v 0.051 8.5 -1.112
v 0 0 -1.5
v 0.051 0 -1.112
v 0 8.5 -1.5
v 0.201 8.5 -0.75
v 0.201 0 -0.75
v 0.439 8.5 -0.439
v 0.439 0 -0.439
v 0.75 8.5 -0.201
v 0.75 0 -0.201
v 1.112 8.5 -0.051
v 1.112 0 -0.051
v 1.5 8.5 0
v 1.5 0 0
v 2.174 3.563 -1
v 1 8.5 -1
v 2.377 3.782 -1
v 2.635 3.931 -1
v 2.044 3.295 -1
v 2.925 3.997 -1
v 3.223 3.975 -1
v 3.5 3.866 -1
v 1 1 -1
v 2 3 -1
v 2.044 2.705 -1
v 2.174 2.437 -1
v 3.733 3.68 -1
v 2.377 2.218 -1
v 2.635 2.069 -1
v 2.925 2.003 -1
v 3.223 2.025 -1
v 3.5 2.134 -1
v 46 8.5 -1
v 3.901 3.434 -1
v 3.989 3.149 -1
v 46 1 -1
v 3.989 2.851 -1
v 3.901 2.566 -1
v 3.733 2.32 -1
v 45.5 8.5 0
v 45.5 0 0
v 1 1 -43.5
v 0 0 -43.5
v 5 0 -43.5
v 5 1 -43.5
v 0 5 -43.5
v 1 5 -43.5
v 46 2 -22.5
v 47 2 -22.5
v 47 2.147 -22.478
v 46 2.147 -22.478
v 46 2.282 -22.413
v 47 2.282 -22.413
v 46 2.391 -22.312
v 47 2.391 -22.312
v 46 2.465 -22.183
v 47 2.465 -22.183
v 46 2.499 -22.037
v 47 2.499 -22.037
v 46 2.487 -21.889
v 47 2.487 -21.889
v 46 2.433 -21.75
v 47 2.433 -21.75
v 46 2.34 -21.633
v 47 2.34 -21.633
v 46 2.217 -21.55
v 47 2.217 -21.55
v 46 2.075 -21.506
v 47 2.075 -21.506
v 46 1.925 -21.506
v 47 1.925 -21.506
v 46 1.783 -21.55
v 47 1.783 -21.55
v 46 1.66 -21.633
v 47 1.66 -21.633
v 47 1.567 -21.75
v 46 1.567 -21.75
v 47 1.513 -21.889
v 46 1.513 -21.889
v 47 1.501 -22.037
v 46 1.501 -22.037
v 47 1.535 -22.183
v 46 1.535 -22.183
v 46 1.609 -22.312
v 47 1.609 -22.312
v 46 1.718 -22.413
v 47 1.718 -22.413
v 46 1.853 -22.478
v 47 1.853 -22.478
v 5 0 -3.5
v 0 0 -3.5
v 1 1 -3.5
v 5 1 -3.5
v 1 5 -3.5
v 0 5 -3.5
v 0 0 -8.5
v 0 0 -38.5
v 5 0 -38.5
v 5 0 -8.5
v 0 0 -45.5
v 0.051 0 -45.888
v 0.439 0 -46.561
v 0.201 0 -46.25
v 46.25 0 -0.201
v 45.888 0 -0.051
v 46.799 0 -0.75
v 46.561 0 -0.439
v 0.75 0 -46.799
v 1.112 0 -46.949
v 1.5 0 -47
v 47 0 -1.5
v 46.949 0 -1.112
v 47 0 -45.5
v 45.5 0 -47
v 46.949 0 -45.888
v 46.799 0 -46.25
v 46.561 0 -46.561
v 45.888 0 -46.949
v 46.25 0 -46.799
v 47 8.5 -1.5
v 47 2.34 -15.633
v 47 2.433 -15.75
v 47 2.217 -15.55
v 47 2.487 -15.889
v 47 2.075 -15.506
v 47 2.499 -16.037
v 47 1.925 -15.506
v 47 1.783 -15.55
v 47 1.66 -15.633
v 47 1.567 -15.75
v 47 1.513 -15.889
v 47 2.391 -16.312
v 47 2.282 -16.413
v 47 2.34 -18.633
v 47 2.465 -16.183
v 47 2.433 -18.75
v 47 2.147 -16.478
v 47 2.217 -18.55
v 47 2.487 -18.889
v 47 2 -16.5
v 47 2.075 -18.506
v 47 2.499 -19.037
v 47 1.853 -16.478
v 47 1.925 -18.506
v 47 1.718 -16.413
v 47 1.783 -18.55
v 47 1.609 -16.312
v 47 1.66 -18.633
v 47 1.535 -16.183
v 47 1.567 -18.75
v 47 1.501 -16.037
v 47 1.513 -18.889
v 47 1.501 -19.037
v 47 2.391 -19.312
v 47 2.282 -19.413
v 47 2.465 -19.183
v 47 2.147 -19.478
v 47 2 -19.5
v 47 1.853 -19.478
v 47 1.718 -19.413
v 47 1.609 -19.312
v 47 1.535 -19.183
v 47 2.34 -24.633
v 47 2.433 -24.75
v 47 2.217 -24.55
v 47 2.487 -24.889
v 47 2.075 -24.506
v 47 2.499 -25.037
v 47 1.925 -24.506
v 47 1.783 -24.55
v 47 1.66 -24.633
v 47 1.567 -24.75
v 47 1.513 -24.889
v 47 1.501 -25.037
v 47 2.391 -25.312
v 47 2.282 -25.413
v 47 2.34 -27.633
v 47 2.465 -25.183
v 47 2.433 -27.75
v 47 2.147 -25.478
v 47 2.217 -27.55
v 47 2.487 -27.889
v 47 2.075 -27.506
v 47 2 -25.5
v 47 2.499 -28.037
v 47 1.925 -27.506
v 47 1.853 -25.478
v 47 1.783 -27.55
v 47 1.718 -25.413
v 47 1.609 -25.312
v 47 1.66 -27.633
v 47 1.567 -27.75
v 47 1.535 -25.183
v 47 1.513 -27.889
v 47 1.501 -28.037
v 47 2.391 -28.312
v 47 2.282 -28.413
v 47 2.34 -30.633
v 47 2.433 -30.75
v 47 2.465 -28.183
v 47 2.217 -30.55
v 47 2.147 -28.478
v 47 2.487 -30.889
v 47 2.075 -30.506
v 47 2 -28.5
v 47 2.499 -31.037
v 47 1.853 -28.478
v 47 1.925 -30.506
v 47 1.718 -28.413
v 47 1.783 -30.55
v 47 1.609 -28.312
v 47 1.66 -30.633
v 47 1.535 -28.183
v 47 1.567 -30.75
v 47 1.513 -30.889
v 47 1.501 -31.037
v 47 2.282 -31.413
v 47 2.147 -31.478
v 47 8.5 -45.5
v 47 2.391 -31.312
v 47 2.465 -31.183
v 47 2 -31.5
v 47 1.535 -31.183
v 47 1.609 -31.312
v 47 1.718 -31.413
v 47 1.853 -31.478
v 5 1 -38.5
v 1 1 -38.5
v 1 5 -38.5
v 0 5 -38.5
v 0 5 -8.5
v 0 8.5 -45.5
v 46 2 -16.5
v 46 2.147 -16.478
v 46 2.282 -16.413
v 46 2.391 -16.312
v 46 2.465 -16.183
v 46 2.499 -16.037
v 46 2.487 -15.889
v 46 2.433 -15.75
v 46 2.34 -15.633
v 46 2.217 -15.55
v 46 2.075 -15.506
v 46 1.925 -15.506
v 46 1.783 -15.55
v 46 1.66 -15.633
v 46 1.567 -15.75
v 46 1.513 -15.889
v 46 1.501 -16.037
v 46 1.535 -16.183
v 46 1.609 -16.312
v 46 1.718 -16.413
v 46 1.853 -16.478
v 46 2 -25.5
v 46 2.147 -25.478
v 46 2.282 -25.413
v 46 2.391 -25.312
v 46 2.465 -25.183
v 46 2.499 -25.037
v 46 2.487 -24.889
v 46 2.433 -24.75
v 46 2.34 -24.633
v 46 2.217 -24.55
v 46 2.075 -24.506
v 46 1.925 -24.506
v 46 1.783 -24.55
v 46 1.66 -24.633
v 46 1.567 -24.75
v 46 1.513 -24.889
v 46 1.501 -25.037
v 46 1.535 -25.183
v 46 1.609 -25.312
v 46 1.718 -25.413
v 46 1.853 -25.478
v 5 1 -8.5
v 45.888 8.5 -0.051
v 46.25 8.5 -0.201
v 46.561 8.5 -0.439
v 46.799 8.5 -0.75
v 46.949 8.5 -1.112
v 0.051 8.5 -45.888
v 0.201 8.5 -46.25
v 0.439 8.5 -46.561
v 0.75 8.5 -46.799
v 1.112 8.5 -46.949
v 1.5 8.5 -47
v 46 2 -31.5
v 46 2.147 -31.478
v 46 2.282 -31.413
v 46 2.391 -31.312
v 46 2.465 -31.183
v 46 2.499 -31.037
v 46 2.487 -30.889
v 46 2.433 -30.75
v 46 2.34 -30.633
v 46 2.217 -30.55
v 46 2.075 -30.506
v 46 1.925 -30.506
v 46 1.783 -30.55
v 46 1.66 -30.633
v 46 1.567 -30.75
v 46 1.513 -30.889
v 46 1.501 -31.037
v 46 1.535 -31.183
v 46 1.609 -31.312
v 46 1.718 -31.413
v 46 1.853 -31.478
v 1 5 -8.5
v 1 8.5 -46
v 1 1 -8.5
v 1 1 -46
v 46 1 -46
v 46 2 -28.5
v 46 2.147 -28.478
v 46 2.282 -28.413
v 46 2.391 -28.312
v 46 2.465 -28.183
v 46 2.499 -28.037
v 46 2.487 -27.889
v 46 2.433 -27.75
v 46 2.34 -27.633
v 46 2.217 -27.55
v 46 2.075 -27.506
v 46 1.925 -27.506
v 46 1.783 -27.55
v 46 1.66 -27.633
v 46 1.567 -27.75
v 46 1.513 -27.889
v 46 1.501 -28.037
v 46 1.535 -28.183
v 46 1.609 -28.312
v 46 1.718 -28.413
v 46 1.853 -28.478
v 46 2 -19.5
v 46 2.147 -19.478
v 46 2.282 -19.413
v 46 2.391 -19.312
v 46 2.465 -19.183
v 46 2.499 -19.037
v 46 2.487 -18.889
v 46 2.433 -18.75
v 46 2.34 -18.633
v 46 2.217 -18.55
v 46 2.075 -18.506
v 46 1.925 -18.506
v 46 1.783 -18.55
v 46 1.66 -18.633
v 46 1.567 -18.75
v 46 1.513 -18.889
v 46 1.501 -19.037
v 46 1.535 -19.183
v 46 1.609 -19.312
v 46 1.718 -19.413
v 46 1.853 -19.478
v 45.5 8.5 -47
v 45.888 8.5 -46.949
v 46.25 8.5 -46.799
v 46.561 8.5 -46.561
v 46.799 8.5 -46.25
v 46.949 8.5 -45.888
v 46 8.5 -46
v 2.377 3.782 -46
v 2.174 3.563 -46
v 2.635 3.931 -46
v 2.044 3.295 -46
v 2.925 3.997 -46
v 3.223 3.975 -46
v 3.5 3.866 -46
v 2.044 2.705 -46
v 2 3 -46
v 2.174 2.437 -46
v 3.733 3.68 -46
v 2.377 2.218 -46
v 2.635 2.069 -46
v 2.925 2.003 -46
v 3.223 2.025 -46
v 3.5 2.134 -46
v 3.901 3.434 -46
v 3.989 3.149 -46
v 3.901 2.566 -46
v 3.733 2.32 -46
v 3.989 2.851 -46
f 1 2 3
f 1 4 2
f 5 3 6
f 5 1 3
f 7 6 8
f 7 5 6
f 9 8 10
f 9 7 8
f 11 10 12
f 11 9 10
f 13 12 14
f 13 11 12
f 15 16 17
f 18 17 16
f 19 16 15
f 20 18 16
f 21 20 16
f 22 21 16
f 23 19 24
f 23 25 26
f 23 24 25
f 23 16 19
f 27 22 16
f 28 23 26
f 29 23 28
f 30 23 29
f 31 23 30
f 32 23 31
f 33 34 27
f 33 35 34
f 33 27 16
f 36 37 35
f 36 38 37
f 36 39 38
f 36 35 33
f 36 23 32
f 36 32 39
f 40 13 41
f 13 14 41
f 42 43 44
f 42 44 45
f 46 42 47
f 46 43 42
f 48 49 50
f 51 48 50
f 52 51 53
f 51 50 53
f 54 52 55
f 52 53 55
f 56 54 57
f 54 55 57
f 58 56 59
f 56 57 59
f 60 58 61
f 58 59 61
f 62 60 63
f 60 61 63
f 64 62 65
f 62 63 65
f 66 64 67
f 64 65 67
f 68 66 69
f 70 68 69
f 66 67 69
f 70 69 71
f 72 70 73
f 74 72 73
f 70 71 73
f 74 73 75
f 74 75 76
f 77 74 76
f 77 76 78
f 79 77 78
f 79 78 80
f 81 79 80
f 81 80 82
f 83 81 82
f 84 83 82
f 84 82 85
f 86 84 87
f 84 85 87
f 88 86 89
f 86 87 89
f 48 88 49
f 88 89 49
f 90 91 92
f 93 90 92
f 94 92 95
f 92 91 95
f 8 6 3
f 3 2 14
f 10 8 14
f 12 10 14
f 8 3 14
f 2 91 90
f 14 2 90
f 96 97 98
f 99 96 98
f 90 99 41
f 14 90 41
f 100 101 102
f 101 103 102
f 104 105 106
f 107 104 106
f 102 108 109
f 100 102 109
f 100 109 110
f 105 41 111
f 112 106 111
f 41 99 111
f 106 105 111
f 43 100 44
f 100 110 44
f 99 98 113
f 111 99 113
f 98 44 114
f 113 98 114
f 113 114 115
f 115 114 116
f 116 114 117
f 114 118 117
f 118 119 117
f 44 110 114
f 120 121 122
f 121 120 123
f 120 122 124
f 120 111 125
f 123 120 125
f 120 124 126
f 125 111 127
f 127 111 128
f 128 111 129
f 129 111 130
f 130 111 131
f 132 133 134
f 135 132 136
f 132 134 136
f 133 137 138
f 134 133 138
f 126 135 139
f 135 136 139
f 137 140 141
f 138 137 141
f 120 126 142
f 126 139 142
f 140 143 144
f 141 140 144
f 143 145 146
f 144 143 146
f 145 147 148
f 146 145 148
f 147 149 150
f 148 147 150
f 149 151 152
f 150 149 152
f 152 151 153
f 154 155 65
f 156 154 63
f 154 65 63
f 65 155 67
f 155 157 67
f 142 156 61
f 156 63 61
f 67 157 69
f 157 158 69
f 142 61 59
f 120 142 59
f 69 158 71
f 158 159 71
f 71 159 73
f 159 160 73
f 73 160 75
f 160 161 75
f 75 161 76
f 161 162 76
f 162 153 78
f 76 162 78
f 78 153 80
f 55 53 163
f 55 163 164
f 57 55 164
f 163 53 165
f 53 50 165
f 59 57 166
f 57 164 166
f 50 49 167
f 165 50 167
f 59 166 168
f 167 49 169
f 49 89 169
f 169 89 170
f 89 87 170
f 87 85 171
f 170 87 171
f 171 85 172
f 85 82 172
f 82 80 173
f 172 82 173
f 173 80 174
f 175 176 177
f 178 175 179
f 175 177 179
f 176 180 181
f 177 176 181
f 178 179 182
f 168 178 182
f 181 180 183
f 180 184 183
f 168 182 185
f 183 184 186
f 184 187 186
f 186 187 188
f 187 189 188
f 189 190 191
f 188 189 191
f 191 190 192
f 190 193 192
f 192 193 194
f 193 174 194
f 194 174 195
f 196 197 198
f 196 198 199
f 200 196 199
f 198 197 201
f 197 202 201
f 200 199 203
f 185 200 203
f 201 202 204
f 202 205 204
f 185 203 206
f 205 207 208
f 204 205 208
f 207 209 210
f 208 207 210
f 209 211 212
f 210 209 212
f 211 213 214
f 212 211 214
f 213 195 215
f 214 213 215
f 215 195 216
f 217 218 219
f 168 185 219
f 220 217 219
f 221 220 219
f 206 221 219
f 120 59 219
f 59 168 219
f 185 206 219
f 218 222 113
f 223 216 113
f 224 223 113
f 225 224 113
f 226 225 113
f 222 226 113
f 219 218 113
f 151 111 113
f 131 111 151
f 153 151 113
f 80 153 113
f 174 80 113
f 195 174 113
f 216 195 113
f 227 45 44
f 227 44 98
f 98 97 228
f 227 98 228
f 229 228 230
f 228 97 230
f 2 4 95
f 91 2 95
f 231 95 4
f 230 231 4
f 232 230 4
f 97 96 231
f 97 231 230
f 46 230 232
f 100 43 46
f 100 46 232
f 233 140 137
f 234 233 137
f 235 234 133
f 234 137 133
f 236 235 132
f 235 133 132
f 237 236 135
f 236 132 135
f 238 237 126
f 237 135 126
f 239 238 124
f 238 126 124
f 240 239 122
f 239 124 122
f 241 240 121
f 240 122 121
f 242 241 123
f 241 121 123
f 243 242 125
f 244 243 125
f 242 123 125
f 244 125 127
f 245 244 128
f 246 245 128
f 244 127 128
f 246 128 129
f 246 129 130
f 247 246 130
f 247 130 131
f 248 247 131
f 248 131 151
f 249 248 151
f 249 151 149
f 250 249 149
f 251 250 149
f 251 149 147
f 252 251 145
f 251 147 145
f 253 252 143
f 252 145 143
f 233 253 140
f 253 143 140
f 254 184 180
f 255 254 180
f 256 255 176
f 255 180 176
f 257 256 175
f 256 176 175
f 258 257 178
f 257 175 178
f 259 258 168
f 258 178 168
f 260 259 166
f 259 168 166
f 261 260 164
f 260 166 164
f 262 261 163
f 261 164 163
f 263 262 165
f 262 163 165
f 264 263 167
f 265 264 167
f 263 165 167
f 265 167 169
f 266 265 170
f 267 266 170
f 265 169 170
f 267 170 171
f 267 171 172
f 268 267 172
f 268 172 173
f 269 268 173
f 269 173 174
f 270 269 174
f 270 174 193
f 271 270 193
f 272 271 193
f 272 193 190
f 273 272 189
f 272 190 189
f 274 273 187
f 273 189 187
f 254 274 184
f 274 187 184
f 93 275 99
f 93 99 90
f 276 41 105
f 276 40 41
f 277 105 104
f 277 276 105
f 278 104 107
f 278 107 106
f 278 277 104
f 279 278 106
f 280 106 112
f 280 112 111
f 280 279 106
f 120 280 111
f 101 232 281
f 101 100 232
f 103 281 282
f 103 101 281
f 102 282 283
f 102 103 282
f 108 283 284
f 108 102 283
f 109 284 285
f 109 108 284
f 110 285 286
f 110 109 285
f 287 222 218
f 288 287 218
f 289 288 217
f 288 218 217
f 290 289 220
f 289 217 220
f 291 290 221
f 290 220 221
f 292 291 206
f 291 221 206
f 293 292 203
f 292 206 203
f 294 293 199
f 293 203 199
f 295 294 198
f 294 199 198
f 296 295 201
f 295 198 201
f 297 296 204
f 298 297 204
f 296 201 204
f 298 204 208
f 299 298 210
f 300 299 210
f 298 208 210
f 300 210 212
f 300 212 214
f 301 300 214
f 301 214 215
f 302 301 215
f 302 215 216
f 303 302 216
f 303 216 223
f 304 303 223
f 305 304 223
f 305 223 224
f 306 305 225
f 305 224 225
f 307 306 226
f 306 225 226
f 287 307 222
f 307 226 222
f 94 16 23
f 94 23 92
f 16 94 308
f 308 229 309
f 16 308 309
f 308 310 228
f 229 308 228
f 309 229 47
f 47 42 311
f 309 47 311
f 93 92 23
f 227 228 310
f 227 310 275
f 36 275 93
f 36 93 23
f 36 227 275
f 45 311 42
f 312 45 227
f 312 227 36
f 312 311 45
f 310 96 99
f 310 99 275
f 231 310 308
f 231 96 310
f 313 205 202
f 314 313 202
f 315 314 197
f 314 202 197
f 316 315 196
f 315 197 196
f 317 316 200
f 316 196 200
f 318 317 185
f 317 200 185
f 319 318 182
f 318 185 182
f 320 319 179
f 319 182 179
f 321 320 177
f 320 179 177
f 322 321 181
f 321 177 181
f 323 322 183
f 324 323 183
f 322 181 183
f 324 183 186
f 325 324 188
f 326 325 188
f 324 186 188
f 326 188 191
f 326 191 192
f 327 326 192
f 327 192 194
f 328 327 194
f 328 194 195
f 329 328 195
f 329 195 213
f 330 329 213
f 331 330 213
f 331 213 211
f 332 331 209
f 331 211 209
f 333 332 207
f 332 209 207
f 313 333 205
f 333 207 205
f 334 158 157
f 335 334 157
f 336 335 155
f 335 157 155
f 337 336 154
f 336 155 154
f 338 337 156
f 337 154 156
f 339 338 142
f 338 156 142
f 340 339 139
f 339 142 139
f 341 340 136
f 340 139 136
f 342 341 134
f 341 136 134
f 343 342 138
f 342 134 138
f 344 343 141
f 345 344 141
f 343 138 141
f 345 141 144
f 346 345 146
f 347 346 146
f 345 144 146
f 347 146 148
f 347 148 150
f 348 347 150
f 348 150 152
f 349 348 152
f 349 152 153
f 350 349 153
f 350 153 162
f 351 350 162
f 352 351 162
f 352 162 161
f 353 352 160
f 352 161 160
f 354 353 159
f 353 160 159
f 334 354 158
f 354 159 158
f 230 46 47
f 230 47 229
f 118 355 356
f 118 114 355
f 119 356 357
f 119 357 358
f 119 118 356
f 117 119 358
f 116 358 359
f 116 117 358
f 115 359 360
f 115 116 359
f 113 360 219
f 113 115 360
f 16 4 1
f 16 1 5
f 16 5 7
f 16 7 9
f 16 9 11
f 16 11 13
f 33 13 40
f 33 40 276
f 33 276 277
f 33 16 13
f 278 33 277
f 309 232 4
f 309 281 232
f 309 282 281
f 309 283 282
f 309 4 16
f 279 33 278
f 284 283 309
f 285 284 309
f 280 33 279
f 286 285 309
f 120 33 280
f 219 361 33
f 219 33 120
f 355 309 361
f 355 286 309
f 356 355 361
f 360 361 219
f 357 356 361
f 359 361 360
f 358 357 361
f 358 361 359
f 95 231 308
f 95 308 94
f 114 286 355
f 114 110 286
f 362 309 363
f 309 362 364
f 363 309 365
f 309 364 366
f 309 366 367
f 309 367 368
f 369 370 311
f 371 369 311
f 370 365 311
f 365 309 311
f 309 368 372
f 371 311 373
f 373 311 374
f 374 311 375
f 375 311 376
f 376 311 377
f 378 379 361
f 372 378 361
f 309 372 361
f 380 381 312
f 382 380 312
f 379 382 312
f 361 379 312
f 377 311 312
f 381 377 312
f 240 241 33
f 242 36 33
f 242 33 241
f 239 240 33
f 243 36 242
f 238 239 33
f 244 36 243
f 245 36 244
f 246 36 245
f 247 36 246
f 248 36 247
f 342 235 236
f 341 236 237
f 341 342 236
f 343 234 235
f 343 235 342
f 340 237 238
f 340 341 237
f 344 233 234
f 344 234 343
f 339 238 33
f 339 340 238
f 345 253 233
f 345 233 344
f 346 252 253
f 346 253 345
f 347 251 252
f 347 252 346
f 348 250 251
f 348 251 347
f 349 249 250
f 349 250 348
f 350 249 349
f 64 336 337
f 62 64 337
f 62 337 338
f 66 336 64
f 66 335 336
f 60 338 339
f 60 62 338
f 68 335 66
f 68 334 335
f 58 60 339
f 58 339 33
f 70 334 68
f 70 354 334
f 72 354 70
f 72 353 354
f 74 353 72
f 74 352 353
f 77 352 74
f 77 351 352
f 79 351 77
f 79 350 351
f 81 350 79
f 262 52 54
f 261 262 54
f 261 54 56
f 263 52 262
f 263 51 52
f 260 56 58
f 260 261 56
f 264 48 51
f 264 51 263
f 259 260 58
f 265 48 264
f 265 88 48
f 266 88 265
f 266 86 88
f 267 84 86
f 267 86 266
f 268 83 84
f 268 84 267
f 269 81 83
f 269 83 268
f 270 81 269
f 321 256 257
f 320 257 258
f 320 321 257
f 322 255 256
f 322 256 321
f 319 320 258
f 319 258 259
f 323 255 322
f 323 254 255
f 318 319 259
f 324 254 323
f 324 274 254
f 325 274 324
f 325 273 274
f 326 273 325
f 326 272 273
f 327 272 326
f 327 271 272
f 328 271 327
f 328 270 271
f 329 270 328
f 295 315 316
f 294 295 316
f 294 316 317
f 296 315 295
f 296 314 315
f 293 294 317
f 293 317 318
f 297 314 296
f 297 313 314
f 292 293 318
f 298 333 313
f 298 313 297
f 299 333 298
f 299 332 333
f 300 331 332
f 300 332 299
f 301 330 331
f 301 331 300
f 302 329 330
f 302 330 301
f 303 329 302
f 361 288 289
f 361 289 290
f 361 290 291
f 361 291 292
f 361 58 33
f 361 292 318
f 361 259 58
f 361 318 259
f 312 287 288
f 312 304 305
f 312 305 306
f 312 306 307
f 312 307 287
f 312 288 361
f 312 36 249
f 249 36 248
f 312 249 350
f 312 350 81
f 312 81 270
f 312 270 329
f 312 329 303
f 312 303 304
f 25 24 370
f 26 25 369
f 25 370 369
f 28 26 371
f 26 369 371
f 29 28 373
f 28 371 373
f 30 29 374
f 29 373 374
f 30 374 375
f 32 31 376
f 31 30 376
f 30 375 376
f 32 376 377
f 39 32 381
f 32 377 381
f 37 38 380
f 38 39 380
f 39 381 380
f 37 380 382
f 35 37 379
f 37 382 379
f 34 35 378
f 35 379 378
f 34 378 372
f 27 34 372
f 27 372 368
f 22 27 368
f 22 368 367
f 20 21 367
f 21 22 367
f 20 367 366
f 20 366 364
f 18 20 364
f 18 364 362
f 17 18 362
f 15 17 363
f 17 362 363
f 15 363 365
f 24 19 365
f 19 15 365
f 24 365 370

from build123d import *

# Parameters (mm, degrees)
SKETCH1_W           = 47
SKETCH1_H           = 47
BOSS_EXTRUDE1_DEPTH = 1
SKETCH2_W           = 47
SKETCH2_H           = 47
SKETCH2_W_2         = 45
SKETCH2_H_2         = 45
BOSS_EXTRUDE2_DEPTH = 7.5
SKETCH4_R           = 0.5
CUT_EXTRUDE3_DEPTH  = 1
LPATTERN1_COUNT     = 6
LPATTERN1_PITCH     = 3
FILLET1_R           = 1.5
SKETCH8_W           = 5
SKETCH8_H           = 5
CUT_EXTRUDE4_DEPTH  = 5
BOSS_EXTRUDE3_REACH = 68.312
SKETCH9_R           = 1


with BuildPart() as part:
    # Sketch1 → Boss-Extrude1 (new body)
    with BuildSketch(Plane(origin=(0, 0, 0), x_dir=(1, 0, 0), z_dir=(0, 1, 0))):
        with Locations((23.5, 23.5)):
            Rectangle(SKETCH1_W, SKETCH1_H)
    extrude(amount=BOSS_EXTRUDE1_DEPTH)

    # Sketch2 → Boss-Extrude2 (add)
    with BuildSketch(Plane(origin=(0, 1, 0), x_dir=(1, 0, 0), z_dir=(0, 1, 0))):
        with Locations((23.5, 23.5)):
            Rectangle(SKETCH2_W, SKETCH2_H)
        with Locations((23.5, 23.5)):
            Rectangle(SKETCH2_W_2, SKETCH2_H_2, mode=Mode.SUBTRACT)
    extrude(amount=BOSS_EXTRUDE2_DEPTH)

    # Sketch4 → Cut-Extrude3 (cut)
    with BuildSketch(Plane(origin=(47, 0, 0), x_dir=(0, 0, -1), z_dir=(1, 0, 0))):
        with Locations((16, 2)):
            Circle(SKETCH4_R)
    cut_extrude3 = extrude(amount=-CUT_EXTRUDE3_DEPTH, mode=Mode.SUBTRACT)

    # LPattern1: Cut-Extrude3 ×6
    with Locations(*[(0, 0, -i * LPATTERN1_PITCH) for i in range(1, LPATTERN1_COUNT)]):
        add(cut_extrude3, mode=Mode.SUBTRACT)

    # Fillet1
    fillet1_edges = [part.edges().sort_by_distance(p)[0] for p in [
        (0, 4.25, -47),
        (47, 4.25, -47),
        (47, 4.25, 0),
        (0, 4.25, 0),
    ]]
    fillet(fillet1_edges, radius=FILLET1_R)

    # Sketch8 → Cut-Extrude4 (cut)
    with BuildSketch(Plane.ZY):
        with Locations((-41, 2.5)):
            Rectangle(SKETCH8_W, SKETCH8_H)
        with Locations((-6, 2.5)):
            Rectangle(SKETCH8_W, SKETCH8_H)
    extrude(amount=-CUT_EXTRUDE4_DEPTH, mode=Mode.SUBTRACT)

    # Sketch9 → Boss-Extrude3 (add, up to next)
    with BuildSketch(Plane.XY.offset(-46), mode=Mode.PRIVATE) as boss_extrude3_sk1:
        with Locations(Location((3, 3, 0), (0, 0, 180))):
            Circle(SKETCH9_R)
    boss_extrude3_tool1 = extrude(boss_extrude3_sk1.sketch, amount=BOSS_EXTRUDE3_REACH, mode=Mode.PRIVATE) - part.part
    add(boss_extrude3_tool1.solids().sort_by_distance((3, 3, -46))[0])


solid = part.part
